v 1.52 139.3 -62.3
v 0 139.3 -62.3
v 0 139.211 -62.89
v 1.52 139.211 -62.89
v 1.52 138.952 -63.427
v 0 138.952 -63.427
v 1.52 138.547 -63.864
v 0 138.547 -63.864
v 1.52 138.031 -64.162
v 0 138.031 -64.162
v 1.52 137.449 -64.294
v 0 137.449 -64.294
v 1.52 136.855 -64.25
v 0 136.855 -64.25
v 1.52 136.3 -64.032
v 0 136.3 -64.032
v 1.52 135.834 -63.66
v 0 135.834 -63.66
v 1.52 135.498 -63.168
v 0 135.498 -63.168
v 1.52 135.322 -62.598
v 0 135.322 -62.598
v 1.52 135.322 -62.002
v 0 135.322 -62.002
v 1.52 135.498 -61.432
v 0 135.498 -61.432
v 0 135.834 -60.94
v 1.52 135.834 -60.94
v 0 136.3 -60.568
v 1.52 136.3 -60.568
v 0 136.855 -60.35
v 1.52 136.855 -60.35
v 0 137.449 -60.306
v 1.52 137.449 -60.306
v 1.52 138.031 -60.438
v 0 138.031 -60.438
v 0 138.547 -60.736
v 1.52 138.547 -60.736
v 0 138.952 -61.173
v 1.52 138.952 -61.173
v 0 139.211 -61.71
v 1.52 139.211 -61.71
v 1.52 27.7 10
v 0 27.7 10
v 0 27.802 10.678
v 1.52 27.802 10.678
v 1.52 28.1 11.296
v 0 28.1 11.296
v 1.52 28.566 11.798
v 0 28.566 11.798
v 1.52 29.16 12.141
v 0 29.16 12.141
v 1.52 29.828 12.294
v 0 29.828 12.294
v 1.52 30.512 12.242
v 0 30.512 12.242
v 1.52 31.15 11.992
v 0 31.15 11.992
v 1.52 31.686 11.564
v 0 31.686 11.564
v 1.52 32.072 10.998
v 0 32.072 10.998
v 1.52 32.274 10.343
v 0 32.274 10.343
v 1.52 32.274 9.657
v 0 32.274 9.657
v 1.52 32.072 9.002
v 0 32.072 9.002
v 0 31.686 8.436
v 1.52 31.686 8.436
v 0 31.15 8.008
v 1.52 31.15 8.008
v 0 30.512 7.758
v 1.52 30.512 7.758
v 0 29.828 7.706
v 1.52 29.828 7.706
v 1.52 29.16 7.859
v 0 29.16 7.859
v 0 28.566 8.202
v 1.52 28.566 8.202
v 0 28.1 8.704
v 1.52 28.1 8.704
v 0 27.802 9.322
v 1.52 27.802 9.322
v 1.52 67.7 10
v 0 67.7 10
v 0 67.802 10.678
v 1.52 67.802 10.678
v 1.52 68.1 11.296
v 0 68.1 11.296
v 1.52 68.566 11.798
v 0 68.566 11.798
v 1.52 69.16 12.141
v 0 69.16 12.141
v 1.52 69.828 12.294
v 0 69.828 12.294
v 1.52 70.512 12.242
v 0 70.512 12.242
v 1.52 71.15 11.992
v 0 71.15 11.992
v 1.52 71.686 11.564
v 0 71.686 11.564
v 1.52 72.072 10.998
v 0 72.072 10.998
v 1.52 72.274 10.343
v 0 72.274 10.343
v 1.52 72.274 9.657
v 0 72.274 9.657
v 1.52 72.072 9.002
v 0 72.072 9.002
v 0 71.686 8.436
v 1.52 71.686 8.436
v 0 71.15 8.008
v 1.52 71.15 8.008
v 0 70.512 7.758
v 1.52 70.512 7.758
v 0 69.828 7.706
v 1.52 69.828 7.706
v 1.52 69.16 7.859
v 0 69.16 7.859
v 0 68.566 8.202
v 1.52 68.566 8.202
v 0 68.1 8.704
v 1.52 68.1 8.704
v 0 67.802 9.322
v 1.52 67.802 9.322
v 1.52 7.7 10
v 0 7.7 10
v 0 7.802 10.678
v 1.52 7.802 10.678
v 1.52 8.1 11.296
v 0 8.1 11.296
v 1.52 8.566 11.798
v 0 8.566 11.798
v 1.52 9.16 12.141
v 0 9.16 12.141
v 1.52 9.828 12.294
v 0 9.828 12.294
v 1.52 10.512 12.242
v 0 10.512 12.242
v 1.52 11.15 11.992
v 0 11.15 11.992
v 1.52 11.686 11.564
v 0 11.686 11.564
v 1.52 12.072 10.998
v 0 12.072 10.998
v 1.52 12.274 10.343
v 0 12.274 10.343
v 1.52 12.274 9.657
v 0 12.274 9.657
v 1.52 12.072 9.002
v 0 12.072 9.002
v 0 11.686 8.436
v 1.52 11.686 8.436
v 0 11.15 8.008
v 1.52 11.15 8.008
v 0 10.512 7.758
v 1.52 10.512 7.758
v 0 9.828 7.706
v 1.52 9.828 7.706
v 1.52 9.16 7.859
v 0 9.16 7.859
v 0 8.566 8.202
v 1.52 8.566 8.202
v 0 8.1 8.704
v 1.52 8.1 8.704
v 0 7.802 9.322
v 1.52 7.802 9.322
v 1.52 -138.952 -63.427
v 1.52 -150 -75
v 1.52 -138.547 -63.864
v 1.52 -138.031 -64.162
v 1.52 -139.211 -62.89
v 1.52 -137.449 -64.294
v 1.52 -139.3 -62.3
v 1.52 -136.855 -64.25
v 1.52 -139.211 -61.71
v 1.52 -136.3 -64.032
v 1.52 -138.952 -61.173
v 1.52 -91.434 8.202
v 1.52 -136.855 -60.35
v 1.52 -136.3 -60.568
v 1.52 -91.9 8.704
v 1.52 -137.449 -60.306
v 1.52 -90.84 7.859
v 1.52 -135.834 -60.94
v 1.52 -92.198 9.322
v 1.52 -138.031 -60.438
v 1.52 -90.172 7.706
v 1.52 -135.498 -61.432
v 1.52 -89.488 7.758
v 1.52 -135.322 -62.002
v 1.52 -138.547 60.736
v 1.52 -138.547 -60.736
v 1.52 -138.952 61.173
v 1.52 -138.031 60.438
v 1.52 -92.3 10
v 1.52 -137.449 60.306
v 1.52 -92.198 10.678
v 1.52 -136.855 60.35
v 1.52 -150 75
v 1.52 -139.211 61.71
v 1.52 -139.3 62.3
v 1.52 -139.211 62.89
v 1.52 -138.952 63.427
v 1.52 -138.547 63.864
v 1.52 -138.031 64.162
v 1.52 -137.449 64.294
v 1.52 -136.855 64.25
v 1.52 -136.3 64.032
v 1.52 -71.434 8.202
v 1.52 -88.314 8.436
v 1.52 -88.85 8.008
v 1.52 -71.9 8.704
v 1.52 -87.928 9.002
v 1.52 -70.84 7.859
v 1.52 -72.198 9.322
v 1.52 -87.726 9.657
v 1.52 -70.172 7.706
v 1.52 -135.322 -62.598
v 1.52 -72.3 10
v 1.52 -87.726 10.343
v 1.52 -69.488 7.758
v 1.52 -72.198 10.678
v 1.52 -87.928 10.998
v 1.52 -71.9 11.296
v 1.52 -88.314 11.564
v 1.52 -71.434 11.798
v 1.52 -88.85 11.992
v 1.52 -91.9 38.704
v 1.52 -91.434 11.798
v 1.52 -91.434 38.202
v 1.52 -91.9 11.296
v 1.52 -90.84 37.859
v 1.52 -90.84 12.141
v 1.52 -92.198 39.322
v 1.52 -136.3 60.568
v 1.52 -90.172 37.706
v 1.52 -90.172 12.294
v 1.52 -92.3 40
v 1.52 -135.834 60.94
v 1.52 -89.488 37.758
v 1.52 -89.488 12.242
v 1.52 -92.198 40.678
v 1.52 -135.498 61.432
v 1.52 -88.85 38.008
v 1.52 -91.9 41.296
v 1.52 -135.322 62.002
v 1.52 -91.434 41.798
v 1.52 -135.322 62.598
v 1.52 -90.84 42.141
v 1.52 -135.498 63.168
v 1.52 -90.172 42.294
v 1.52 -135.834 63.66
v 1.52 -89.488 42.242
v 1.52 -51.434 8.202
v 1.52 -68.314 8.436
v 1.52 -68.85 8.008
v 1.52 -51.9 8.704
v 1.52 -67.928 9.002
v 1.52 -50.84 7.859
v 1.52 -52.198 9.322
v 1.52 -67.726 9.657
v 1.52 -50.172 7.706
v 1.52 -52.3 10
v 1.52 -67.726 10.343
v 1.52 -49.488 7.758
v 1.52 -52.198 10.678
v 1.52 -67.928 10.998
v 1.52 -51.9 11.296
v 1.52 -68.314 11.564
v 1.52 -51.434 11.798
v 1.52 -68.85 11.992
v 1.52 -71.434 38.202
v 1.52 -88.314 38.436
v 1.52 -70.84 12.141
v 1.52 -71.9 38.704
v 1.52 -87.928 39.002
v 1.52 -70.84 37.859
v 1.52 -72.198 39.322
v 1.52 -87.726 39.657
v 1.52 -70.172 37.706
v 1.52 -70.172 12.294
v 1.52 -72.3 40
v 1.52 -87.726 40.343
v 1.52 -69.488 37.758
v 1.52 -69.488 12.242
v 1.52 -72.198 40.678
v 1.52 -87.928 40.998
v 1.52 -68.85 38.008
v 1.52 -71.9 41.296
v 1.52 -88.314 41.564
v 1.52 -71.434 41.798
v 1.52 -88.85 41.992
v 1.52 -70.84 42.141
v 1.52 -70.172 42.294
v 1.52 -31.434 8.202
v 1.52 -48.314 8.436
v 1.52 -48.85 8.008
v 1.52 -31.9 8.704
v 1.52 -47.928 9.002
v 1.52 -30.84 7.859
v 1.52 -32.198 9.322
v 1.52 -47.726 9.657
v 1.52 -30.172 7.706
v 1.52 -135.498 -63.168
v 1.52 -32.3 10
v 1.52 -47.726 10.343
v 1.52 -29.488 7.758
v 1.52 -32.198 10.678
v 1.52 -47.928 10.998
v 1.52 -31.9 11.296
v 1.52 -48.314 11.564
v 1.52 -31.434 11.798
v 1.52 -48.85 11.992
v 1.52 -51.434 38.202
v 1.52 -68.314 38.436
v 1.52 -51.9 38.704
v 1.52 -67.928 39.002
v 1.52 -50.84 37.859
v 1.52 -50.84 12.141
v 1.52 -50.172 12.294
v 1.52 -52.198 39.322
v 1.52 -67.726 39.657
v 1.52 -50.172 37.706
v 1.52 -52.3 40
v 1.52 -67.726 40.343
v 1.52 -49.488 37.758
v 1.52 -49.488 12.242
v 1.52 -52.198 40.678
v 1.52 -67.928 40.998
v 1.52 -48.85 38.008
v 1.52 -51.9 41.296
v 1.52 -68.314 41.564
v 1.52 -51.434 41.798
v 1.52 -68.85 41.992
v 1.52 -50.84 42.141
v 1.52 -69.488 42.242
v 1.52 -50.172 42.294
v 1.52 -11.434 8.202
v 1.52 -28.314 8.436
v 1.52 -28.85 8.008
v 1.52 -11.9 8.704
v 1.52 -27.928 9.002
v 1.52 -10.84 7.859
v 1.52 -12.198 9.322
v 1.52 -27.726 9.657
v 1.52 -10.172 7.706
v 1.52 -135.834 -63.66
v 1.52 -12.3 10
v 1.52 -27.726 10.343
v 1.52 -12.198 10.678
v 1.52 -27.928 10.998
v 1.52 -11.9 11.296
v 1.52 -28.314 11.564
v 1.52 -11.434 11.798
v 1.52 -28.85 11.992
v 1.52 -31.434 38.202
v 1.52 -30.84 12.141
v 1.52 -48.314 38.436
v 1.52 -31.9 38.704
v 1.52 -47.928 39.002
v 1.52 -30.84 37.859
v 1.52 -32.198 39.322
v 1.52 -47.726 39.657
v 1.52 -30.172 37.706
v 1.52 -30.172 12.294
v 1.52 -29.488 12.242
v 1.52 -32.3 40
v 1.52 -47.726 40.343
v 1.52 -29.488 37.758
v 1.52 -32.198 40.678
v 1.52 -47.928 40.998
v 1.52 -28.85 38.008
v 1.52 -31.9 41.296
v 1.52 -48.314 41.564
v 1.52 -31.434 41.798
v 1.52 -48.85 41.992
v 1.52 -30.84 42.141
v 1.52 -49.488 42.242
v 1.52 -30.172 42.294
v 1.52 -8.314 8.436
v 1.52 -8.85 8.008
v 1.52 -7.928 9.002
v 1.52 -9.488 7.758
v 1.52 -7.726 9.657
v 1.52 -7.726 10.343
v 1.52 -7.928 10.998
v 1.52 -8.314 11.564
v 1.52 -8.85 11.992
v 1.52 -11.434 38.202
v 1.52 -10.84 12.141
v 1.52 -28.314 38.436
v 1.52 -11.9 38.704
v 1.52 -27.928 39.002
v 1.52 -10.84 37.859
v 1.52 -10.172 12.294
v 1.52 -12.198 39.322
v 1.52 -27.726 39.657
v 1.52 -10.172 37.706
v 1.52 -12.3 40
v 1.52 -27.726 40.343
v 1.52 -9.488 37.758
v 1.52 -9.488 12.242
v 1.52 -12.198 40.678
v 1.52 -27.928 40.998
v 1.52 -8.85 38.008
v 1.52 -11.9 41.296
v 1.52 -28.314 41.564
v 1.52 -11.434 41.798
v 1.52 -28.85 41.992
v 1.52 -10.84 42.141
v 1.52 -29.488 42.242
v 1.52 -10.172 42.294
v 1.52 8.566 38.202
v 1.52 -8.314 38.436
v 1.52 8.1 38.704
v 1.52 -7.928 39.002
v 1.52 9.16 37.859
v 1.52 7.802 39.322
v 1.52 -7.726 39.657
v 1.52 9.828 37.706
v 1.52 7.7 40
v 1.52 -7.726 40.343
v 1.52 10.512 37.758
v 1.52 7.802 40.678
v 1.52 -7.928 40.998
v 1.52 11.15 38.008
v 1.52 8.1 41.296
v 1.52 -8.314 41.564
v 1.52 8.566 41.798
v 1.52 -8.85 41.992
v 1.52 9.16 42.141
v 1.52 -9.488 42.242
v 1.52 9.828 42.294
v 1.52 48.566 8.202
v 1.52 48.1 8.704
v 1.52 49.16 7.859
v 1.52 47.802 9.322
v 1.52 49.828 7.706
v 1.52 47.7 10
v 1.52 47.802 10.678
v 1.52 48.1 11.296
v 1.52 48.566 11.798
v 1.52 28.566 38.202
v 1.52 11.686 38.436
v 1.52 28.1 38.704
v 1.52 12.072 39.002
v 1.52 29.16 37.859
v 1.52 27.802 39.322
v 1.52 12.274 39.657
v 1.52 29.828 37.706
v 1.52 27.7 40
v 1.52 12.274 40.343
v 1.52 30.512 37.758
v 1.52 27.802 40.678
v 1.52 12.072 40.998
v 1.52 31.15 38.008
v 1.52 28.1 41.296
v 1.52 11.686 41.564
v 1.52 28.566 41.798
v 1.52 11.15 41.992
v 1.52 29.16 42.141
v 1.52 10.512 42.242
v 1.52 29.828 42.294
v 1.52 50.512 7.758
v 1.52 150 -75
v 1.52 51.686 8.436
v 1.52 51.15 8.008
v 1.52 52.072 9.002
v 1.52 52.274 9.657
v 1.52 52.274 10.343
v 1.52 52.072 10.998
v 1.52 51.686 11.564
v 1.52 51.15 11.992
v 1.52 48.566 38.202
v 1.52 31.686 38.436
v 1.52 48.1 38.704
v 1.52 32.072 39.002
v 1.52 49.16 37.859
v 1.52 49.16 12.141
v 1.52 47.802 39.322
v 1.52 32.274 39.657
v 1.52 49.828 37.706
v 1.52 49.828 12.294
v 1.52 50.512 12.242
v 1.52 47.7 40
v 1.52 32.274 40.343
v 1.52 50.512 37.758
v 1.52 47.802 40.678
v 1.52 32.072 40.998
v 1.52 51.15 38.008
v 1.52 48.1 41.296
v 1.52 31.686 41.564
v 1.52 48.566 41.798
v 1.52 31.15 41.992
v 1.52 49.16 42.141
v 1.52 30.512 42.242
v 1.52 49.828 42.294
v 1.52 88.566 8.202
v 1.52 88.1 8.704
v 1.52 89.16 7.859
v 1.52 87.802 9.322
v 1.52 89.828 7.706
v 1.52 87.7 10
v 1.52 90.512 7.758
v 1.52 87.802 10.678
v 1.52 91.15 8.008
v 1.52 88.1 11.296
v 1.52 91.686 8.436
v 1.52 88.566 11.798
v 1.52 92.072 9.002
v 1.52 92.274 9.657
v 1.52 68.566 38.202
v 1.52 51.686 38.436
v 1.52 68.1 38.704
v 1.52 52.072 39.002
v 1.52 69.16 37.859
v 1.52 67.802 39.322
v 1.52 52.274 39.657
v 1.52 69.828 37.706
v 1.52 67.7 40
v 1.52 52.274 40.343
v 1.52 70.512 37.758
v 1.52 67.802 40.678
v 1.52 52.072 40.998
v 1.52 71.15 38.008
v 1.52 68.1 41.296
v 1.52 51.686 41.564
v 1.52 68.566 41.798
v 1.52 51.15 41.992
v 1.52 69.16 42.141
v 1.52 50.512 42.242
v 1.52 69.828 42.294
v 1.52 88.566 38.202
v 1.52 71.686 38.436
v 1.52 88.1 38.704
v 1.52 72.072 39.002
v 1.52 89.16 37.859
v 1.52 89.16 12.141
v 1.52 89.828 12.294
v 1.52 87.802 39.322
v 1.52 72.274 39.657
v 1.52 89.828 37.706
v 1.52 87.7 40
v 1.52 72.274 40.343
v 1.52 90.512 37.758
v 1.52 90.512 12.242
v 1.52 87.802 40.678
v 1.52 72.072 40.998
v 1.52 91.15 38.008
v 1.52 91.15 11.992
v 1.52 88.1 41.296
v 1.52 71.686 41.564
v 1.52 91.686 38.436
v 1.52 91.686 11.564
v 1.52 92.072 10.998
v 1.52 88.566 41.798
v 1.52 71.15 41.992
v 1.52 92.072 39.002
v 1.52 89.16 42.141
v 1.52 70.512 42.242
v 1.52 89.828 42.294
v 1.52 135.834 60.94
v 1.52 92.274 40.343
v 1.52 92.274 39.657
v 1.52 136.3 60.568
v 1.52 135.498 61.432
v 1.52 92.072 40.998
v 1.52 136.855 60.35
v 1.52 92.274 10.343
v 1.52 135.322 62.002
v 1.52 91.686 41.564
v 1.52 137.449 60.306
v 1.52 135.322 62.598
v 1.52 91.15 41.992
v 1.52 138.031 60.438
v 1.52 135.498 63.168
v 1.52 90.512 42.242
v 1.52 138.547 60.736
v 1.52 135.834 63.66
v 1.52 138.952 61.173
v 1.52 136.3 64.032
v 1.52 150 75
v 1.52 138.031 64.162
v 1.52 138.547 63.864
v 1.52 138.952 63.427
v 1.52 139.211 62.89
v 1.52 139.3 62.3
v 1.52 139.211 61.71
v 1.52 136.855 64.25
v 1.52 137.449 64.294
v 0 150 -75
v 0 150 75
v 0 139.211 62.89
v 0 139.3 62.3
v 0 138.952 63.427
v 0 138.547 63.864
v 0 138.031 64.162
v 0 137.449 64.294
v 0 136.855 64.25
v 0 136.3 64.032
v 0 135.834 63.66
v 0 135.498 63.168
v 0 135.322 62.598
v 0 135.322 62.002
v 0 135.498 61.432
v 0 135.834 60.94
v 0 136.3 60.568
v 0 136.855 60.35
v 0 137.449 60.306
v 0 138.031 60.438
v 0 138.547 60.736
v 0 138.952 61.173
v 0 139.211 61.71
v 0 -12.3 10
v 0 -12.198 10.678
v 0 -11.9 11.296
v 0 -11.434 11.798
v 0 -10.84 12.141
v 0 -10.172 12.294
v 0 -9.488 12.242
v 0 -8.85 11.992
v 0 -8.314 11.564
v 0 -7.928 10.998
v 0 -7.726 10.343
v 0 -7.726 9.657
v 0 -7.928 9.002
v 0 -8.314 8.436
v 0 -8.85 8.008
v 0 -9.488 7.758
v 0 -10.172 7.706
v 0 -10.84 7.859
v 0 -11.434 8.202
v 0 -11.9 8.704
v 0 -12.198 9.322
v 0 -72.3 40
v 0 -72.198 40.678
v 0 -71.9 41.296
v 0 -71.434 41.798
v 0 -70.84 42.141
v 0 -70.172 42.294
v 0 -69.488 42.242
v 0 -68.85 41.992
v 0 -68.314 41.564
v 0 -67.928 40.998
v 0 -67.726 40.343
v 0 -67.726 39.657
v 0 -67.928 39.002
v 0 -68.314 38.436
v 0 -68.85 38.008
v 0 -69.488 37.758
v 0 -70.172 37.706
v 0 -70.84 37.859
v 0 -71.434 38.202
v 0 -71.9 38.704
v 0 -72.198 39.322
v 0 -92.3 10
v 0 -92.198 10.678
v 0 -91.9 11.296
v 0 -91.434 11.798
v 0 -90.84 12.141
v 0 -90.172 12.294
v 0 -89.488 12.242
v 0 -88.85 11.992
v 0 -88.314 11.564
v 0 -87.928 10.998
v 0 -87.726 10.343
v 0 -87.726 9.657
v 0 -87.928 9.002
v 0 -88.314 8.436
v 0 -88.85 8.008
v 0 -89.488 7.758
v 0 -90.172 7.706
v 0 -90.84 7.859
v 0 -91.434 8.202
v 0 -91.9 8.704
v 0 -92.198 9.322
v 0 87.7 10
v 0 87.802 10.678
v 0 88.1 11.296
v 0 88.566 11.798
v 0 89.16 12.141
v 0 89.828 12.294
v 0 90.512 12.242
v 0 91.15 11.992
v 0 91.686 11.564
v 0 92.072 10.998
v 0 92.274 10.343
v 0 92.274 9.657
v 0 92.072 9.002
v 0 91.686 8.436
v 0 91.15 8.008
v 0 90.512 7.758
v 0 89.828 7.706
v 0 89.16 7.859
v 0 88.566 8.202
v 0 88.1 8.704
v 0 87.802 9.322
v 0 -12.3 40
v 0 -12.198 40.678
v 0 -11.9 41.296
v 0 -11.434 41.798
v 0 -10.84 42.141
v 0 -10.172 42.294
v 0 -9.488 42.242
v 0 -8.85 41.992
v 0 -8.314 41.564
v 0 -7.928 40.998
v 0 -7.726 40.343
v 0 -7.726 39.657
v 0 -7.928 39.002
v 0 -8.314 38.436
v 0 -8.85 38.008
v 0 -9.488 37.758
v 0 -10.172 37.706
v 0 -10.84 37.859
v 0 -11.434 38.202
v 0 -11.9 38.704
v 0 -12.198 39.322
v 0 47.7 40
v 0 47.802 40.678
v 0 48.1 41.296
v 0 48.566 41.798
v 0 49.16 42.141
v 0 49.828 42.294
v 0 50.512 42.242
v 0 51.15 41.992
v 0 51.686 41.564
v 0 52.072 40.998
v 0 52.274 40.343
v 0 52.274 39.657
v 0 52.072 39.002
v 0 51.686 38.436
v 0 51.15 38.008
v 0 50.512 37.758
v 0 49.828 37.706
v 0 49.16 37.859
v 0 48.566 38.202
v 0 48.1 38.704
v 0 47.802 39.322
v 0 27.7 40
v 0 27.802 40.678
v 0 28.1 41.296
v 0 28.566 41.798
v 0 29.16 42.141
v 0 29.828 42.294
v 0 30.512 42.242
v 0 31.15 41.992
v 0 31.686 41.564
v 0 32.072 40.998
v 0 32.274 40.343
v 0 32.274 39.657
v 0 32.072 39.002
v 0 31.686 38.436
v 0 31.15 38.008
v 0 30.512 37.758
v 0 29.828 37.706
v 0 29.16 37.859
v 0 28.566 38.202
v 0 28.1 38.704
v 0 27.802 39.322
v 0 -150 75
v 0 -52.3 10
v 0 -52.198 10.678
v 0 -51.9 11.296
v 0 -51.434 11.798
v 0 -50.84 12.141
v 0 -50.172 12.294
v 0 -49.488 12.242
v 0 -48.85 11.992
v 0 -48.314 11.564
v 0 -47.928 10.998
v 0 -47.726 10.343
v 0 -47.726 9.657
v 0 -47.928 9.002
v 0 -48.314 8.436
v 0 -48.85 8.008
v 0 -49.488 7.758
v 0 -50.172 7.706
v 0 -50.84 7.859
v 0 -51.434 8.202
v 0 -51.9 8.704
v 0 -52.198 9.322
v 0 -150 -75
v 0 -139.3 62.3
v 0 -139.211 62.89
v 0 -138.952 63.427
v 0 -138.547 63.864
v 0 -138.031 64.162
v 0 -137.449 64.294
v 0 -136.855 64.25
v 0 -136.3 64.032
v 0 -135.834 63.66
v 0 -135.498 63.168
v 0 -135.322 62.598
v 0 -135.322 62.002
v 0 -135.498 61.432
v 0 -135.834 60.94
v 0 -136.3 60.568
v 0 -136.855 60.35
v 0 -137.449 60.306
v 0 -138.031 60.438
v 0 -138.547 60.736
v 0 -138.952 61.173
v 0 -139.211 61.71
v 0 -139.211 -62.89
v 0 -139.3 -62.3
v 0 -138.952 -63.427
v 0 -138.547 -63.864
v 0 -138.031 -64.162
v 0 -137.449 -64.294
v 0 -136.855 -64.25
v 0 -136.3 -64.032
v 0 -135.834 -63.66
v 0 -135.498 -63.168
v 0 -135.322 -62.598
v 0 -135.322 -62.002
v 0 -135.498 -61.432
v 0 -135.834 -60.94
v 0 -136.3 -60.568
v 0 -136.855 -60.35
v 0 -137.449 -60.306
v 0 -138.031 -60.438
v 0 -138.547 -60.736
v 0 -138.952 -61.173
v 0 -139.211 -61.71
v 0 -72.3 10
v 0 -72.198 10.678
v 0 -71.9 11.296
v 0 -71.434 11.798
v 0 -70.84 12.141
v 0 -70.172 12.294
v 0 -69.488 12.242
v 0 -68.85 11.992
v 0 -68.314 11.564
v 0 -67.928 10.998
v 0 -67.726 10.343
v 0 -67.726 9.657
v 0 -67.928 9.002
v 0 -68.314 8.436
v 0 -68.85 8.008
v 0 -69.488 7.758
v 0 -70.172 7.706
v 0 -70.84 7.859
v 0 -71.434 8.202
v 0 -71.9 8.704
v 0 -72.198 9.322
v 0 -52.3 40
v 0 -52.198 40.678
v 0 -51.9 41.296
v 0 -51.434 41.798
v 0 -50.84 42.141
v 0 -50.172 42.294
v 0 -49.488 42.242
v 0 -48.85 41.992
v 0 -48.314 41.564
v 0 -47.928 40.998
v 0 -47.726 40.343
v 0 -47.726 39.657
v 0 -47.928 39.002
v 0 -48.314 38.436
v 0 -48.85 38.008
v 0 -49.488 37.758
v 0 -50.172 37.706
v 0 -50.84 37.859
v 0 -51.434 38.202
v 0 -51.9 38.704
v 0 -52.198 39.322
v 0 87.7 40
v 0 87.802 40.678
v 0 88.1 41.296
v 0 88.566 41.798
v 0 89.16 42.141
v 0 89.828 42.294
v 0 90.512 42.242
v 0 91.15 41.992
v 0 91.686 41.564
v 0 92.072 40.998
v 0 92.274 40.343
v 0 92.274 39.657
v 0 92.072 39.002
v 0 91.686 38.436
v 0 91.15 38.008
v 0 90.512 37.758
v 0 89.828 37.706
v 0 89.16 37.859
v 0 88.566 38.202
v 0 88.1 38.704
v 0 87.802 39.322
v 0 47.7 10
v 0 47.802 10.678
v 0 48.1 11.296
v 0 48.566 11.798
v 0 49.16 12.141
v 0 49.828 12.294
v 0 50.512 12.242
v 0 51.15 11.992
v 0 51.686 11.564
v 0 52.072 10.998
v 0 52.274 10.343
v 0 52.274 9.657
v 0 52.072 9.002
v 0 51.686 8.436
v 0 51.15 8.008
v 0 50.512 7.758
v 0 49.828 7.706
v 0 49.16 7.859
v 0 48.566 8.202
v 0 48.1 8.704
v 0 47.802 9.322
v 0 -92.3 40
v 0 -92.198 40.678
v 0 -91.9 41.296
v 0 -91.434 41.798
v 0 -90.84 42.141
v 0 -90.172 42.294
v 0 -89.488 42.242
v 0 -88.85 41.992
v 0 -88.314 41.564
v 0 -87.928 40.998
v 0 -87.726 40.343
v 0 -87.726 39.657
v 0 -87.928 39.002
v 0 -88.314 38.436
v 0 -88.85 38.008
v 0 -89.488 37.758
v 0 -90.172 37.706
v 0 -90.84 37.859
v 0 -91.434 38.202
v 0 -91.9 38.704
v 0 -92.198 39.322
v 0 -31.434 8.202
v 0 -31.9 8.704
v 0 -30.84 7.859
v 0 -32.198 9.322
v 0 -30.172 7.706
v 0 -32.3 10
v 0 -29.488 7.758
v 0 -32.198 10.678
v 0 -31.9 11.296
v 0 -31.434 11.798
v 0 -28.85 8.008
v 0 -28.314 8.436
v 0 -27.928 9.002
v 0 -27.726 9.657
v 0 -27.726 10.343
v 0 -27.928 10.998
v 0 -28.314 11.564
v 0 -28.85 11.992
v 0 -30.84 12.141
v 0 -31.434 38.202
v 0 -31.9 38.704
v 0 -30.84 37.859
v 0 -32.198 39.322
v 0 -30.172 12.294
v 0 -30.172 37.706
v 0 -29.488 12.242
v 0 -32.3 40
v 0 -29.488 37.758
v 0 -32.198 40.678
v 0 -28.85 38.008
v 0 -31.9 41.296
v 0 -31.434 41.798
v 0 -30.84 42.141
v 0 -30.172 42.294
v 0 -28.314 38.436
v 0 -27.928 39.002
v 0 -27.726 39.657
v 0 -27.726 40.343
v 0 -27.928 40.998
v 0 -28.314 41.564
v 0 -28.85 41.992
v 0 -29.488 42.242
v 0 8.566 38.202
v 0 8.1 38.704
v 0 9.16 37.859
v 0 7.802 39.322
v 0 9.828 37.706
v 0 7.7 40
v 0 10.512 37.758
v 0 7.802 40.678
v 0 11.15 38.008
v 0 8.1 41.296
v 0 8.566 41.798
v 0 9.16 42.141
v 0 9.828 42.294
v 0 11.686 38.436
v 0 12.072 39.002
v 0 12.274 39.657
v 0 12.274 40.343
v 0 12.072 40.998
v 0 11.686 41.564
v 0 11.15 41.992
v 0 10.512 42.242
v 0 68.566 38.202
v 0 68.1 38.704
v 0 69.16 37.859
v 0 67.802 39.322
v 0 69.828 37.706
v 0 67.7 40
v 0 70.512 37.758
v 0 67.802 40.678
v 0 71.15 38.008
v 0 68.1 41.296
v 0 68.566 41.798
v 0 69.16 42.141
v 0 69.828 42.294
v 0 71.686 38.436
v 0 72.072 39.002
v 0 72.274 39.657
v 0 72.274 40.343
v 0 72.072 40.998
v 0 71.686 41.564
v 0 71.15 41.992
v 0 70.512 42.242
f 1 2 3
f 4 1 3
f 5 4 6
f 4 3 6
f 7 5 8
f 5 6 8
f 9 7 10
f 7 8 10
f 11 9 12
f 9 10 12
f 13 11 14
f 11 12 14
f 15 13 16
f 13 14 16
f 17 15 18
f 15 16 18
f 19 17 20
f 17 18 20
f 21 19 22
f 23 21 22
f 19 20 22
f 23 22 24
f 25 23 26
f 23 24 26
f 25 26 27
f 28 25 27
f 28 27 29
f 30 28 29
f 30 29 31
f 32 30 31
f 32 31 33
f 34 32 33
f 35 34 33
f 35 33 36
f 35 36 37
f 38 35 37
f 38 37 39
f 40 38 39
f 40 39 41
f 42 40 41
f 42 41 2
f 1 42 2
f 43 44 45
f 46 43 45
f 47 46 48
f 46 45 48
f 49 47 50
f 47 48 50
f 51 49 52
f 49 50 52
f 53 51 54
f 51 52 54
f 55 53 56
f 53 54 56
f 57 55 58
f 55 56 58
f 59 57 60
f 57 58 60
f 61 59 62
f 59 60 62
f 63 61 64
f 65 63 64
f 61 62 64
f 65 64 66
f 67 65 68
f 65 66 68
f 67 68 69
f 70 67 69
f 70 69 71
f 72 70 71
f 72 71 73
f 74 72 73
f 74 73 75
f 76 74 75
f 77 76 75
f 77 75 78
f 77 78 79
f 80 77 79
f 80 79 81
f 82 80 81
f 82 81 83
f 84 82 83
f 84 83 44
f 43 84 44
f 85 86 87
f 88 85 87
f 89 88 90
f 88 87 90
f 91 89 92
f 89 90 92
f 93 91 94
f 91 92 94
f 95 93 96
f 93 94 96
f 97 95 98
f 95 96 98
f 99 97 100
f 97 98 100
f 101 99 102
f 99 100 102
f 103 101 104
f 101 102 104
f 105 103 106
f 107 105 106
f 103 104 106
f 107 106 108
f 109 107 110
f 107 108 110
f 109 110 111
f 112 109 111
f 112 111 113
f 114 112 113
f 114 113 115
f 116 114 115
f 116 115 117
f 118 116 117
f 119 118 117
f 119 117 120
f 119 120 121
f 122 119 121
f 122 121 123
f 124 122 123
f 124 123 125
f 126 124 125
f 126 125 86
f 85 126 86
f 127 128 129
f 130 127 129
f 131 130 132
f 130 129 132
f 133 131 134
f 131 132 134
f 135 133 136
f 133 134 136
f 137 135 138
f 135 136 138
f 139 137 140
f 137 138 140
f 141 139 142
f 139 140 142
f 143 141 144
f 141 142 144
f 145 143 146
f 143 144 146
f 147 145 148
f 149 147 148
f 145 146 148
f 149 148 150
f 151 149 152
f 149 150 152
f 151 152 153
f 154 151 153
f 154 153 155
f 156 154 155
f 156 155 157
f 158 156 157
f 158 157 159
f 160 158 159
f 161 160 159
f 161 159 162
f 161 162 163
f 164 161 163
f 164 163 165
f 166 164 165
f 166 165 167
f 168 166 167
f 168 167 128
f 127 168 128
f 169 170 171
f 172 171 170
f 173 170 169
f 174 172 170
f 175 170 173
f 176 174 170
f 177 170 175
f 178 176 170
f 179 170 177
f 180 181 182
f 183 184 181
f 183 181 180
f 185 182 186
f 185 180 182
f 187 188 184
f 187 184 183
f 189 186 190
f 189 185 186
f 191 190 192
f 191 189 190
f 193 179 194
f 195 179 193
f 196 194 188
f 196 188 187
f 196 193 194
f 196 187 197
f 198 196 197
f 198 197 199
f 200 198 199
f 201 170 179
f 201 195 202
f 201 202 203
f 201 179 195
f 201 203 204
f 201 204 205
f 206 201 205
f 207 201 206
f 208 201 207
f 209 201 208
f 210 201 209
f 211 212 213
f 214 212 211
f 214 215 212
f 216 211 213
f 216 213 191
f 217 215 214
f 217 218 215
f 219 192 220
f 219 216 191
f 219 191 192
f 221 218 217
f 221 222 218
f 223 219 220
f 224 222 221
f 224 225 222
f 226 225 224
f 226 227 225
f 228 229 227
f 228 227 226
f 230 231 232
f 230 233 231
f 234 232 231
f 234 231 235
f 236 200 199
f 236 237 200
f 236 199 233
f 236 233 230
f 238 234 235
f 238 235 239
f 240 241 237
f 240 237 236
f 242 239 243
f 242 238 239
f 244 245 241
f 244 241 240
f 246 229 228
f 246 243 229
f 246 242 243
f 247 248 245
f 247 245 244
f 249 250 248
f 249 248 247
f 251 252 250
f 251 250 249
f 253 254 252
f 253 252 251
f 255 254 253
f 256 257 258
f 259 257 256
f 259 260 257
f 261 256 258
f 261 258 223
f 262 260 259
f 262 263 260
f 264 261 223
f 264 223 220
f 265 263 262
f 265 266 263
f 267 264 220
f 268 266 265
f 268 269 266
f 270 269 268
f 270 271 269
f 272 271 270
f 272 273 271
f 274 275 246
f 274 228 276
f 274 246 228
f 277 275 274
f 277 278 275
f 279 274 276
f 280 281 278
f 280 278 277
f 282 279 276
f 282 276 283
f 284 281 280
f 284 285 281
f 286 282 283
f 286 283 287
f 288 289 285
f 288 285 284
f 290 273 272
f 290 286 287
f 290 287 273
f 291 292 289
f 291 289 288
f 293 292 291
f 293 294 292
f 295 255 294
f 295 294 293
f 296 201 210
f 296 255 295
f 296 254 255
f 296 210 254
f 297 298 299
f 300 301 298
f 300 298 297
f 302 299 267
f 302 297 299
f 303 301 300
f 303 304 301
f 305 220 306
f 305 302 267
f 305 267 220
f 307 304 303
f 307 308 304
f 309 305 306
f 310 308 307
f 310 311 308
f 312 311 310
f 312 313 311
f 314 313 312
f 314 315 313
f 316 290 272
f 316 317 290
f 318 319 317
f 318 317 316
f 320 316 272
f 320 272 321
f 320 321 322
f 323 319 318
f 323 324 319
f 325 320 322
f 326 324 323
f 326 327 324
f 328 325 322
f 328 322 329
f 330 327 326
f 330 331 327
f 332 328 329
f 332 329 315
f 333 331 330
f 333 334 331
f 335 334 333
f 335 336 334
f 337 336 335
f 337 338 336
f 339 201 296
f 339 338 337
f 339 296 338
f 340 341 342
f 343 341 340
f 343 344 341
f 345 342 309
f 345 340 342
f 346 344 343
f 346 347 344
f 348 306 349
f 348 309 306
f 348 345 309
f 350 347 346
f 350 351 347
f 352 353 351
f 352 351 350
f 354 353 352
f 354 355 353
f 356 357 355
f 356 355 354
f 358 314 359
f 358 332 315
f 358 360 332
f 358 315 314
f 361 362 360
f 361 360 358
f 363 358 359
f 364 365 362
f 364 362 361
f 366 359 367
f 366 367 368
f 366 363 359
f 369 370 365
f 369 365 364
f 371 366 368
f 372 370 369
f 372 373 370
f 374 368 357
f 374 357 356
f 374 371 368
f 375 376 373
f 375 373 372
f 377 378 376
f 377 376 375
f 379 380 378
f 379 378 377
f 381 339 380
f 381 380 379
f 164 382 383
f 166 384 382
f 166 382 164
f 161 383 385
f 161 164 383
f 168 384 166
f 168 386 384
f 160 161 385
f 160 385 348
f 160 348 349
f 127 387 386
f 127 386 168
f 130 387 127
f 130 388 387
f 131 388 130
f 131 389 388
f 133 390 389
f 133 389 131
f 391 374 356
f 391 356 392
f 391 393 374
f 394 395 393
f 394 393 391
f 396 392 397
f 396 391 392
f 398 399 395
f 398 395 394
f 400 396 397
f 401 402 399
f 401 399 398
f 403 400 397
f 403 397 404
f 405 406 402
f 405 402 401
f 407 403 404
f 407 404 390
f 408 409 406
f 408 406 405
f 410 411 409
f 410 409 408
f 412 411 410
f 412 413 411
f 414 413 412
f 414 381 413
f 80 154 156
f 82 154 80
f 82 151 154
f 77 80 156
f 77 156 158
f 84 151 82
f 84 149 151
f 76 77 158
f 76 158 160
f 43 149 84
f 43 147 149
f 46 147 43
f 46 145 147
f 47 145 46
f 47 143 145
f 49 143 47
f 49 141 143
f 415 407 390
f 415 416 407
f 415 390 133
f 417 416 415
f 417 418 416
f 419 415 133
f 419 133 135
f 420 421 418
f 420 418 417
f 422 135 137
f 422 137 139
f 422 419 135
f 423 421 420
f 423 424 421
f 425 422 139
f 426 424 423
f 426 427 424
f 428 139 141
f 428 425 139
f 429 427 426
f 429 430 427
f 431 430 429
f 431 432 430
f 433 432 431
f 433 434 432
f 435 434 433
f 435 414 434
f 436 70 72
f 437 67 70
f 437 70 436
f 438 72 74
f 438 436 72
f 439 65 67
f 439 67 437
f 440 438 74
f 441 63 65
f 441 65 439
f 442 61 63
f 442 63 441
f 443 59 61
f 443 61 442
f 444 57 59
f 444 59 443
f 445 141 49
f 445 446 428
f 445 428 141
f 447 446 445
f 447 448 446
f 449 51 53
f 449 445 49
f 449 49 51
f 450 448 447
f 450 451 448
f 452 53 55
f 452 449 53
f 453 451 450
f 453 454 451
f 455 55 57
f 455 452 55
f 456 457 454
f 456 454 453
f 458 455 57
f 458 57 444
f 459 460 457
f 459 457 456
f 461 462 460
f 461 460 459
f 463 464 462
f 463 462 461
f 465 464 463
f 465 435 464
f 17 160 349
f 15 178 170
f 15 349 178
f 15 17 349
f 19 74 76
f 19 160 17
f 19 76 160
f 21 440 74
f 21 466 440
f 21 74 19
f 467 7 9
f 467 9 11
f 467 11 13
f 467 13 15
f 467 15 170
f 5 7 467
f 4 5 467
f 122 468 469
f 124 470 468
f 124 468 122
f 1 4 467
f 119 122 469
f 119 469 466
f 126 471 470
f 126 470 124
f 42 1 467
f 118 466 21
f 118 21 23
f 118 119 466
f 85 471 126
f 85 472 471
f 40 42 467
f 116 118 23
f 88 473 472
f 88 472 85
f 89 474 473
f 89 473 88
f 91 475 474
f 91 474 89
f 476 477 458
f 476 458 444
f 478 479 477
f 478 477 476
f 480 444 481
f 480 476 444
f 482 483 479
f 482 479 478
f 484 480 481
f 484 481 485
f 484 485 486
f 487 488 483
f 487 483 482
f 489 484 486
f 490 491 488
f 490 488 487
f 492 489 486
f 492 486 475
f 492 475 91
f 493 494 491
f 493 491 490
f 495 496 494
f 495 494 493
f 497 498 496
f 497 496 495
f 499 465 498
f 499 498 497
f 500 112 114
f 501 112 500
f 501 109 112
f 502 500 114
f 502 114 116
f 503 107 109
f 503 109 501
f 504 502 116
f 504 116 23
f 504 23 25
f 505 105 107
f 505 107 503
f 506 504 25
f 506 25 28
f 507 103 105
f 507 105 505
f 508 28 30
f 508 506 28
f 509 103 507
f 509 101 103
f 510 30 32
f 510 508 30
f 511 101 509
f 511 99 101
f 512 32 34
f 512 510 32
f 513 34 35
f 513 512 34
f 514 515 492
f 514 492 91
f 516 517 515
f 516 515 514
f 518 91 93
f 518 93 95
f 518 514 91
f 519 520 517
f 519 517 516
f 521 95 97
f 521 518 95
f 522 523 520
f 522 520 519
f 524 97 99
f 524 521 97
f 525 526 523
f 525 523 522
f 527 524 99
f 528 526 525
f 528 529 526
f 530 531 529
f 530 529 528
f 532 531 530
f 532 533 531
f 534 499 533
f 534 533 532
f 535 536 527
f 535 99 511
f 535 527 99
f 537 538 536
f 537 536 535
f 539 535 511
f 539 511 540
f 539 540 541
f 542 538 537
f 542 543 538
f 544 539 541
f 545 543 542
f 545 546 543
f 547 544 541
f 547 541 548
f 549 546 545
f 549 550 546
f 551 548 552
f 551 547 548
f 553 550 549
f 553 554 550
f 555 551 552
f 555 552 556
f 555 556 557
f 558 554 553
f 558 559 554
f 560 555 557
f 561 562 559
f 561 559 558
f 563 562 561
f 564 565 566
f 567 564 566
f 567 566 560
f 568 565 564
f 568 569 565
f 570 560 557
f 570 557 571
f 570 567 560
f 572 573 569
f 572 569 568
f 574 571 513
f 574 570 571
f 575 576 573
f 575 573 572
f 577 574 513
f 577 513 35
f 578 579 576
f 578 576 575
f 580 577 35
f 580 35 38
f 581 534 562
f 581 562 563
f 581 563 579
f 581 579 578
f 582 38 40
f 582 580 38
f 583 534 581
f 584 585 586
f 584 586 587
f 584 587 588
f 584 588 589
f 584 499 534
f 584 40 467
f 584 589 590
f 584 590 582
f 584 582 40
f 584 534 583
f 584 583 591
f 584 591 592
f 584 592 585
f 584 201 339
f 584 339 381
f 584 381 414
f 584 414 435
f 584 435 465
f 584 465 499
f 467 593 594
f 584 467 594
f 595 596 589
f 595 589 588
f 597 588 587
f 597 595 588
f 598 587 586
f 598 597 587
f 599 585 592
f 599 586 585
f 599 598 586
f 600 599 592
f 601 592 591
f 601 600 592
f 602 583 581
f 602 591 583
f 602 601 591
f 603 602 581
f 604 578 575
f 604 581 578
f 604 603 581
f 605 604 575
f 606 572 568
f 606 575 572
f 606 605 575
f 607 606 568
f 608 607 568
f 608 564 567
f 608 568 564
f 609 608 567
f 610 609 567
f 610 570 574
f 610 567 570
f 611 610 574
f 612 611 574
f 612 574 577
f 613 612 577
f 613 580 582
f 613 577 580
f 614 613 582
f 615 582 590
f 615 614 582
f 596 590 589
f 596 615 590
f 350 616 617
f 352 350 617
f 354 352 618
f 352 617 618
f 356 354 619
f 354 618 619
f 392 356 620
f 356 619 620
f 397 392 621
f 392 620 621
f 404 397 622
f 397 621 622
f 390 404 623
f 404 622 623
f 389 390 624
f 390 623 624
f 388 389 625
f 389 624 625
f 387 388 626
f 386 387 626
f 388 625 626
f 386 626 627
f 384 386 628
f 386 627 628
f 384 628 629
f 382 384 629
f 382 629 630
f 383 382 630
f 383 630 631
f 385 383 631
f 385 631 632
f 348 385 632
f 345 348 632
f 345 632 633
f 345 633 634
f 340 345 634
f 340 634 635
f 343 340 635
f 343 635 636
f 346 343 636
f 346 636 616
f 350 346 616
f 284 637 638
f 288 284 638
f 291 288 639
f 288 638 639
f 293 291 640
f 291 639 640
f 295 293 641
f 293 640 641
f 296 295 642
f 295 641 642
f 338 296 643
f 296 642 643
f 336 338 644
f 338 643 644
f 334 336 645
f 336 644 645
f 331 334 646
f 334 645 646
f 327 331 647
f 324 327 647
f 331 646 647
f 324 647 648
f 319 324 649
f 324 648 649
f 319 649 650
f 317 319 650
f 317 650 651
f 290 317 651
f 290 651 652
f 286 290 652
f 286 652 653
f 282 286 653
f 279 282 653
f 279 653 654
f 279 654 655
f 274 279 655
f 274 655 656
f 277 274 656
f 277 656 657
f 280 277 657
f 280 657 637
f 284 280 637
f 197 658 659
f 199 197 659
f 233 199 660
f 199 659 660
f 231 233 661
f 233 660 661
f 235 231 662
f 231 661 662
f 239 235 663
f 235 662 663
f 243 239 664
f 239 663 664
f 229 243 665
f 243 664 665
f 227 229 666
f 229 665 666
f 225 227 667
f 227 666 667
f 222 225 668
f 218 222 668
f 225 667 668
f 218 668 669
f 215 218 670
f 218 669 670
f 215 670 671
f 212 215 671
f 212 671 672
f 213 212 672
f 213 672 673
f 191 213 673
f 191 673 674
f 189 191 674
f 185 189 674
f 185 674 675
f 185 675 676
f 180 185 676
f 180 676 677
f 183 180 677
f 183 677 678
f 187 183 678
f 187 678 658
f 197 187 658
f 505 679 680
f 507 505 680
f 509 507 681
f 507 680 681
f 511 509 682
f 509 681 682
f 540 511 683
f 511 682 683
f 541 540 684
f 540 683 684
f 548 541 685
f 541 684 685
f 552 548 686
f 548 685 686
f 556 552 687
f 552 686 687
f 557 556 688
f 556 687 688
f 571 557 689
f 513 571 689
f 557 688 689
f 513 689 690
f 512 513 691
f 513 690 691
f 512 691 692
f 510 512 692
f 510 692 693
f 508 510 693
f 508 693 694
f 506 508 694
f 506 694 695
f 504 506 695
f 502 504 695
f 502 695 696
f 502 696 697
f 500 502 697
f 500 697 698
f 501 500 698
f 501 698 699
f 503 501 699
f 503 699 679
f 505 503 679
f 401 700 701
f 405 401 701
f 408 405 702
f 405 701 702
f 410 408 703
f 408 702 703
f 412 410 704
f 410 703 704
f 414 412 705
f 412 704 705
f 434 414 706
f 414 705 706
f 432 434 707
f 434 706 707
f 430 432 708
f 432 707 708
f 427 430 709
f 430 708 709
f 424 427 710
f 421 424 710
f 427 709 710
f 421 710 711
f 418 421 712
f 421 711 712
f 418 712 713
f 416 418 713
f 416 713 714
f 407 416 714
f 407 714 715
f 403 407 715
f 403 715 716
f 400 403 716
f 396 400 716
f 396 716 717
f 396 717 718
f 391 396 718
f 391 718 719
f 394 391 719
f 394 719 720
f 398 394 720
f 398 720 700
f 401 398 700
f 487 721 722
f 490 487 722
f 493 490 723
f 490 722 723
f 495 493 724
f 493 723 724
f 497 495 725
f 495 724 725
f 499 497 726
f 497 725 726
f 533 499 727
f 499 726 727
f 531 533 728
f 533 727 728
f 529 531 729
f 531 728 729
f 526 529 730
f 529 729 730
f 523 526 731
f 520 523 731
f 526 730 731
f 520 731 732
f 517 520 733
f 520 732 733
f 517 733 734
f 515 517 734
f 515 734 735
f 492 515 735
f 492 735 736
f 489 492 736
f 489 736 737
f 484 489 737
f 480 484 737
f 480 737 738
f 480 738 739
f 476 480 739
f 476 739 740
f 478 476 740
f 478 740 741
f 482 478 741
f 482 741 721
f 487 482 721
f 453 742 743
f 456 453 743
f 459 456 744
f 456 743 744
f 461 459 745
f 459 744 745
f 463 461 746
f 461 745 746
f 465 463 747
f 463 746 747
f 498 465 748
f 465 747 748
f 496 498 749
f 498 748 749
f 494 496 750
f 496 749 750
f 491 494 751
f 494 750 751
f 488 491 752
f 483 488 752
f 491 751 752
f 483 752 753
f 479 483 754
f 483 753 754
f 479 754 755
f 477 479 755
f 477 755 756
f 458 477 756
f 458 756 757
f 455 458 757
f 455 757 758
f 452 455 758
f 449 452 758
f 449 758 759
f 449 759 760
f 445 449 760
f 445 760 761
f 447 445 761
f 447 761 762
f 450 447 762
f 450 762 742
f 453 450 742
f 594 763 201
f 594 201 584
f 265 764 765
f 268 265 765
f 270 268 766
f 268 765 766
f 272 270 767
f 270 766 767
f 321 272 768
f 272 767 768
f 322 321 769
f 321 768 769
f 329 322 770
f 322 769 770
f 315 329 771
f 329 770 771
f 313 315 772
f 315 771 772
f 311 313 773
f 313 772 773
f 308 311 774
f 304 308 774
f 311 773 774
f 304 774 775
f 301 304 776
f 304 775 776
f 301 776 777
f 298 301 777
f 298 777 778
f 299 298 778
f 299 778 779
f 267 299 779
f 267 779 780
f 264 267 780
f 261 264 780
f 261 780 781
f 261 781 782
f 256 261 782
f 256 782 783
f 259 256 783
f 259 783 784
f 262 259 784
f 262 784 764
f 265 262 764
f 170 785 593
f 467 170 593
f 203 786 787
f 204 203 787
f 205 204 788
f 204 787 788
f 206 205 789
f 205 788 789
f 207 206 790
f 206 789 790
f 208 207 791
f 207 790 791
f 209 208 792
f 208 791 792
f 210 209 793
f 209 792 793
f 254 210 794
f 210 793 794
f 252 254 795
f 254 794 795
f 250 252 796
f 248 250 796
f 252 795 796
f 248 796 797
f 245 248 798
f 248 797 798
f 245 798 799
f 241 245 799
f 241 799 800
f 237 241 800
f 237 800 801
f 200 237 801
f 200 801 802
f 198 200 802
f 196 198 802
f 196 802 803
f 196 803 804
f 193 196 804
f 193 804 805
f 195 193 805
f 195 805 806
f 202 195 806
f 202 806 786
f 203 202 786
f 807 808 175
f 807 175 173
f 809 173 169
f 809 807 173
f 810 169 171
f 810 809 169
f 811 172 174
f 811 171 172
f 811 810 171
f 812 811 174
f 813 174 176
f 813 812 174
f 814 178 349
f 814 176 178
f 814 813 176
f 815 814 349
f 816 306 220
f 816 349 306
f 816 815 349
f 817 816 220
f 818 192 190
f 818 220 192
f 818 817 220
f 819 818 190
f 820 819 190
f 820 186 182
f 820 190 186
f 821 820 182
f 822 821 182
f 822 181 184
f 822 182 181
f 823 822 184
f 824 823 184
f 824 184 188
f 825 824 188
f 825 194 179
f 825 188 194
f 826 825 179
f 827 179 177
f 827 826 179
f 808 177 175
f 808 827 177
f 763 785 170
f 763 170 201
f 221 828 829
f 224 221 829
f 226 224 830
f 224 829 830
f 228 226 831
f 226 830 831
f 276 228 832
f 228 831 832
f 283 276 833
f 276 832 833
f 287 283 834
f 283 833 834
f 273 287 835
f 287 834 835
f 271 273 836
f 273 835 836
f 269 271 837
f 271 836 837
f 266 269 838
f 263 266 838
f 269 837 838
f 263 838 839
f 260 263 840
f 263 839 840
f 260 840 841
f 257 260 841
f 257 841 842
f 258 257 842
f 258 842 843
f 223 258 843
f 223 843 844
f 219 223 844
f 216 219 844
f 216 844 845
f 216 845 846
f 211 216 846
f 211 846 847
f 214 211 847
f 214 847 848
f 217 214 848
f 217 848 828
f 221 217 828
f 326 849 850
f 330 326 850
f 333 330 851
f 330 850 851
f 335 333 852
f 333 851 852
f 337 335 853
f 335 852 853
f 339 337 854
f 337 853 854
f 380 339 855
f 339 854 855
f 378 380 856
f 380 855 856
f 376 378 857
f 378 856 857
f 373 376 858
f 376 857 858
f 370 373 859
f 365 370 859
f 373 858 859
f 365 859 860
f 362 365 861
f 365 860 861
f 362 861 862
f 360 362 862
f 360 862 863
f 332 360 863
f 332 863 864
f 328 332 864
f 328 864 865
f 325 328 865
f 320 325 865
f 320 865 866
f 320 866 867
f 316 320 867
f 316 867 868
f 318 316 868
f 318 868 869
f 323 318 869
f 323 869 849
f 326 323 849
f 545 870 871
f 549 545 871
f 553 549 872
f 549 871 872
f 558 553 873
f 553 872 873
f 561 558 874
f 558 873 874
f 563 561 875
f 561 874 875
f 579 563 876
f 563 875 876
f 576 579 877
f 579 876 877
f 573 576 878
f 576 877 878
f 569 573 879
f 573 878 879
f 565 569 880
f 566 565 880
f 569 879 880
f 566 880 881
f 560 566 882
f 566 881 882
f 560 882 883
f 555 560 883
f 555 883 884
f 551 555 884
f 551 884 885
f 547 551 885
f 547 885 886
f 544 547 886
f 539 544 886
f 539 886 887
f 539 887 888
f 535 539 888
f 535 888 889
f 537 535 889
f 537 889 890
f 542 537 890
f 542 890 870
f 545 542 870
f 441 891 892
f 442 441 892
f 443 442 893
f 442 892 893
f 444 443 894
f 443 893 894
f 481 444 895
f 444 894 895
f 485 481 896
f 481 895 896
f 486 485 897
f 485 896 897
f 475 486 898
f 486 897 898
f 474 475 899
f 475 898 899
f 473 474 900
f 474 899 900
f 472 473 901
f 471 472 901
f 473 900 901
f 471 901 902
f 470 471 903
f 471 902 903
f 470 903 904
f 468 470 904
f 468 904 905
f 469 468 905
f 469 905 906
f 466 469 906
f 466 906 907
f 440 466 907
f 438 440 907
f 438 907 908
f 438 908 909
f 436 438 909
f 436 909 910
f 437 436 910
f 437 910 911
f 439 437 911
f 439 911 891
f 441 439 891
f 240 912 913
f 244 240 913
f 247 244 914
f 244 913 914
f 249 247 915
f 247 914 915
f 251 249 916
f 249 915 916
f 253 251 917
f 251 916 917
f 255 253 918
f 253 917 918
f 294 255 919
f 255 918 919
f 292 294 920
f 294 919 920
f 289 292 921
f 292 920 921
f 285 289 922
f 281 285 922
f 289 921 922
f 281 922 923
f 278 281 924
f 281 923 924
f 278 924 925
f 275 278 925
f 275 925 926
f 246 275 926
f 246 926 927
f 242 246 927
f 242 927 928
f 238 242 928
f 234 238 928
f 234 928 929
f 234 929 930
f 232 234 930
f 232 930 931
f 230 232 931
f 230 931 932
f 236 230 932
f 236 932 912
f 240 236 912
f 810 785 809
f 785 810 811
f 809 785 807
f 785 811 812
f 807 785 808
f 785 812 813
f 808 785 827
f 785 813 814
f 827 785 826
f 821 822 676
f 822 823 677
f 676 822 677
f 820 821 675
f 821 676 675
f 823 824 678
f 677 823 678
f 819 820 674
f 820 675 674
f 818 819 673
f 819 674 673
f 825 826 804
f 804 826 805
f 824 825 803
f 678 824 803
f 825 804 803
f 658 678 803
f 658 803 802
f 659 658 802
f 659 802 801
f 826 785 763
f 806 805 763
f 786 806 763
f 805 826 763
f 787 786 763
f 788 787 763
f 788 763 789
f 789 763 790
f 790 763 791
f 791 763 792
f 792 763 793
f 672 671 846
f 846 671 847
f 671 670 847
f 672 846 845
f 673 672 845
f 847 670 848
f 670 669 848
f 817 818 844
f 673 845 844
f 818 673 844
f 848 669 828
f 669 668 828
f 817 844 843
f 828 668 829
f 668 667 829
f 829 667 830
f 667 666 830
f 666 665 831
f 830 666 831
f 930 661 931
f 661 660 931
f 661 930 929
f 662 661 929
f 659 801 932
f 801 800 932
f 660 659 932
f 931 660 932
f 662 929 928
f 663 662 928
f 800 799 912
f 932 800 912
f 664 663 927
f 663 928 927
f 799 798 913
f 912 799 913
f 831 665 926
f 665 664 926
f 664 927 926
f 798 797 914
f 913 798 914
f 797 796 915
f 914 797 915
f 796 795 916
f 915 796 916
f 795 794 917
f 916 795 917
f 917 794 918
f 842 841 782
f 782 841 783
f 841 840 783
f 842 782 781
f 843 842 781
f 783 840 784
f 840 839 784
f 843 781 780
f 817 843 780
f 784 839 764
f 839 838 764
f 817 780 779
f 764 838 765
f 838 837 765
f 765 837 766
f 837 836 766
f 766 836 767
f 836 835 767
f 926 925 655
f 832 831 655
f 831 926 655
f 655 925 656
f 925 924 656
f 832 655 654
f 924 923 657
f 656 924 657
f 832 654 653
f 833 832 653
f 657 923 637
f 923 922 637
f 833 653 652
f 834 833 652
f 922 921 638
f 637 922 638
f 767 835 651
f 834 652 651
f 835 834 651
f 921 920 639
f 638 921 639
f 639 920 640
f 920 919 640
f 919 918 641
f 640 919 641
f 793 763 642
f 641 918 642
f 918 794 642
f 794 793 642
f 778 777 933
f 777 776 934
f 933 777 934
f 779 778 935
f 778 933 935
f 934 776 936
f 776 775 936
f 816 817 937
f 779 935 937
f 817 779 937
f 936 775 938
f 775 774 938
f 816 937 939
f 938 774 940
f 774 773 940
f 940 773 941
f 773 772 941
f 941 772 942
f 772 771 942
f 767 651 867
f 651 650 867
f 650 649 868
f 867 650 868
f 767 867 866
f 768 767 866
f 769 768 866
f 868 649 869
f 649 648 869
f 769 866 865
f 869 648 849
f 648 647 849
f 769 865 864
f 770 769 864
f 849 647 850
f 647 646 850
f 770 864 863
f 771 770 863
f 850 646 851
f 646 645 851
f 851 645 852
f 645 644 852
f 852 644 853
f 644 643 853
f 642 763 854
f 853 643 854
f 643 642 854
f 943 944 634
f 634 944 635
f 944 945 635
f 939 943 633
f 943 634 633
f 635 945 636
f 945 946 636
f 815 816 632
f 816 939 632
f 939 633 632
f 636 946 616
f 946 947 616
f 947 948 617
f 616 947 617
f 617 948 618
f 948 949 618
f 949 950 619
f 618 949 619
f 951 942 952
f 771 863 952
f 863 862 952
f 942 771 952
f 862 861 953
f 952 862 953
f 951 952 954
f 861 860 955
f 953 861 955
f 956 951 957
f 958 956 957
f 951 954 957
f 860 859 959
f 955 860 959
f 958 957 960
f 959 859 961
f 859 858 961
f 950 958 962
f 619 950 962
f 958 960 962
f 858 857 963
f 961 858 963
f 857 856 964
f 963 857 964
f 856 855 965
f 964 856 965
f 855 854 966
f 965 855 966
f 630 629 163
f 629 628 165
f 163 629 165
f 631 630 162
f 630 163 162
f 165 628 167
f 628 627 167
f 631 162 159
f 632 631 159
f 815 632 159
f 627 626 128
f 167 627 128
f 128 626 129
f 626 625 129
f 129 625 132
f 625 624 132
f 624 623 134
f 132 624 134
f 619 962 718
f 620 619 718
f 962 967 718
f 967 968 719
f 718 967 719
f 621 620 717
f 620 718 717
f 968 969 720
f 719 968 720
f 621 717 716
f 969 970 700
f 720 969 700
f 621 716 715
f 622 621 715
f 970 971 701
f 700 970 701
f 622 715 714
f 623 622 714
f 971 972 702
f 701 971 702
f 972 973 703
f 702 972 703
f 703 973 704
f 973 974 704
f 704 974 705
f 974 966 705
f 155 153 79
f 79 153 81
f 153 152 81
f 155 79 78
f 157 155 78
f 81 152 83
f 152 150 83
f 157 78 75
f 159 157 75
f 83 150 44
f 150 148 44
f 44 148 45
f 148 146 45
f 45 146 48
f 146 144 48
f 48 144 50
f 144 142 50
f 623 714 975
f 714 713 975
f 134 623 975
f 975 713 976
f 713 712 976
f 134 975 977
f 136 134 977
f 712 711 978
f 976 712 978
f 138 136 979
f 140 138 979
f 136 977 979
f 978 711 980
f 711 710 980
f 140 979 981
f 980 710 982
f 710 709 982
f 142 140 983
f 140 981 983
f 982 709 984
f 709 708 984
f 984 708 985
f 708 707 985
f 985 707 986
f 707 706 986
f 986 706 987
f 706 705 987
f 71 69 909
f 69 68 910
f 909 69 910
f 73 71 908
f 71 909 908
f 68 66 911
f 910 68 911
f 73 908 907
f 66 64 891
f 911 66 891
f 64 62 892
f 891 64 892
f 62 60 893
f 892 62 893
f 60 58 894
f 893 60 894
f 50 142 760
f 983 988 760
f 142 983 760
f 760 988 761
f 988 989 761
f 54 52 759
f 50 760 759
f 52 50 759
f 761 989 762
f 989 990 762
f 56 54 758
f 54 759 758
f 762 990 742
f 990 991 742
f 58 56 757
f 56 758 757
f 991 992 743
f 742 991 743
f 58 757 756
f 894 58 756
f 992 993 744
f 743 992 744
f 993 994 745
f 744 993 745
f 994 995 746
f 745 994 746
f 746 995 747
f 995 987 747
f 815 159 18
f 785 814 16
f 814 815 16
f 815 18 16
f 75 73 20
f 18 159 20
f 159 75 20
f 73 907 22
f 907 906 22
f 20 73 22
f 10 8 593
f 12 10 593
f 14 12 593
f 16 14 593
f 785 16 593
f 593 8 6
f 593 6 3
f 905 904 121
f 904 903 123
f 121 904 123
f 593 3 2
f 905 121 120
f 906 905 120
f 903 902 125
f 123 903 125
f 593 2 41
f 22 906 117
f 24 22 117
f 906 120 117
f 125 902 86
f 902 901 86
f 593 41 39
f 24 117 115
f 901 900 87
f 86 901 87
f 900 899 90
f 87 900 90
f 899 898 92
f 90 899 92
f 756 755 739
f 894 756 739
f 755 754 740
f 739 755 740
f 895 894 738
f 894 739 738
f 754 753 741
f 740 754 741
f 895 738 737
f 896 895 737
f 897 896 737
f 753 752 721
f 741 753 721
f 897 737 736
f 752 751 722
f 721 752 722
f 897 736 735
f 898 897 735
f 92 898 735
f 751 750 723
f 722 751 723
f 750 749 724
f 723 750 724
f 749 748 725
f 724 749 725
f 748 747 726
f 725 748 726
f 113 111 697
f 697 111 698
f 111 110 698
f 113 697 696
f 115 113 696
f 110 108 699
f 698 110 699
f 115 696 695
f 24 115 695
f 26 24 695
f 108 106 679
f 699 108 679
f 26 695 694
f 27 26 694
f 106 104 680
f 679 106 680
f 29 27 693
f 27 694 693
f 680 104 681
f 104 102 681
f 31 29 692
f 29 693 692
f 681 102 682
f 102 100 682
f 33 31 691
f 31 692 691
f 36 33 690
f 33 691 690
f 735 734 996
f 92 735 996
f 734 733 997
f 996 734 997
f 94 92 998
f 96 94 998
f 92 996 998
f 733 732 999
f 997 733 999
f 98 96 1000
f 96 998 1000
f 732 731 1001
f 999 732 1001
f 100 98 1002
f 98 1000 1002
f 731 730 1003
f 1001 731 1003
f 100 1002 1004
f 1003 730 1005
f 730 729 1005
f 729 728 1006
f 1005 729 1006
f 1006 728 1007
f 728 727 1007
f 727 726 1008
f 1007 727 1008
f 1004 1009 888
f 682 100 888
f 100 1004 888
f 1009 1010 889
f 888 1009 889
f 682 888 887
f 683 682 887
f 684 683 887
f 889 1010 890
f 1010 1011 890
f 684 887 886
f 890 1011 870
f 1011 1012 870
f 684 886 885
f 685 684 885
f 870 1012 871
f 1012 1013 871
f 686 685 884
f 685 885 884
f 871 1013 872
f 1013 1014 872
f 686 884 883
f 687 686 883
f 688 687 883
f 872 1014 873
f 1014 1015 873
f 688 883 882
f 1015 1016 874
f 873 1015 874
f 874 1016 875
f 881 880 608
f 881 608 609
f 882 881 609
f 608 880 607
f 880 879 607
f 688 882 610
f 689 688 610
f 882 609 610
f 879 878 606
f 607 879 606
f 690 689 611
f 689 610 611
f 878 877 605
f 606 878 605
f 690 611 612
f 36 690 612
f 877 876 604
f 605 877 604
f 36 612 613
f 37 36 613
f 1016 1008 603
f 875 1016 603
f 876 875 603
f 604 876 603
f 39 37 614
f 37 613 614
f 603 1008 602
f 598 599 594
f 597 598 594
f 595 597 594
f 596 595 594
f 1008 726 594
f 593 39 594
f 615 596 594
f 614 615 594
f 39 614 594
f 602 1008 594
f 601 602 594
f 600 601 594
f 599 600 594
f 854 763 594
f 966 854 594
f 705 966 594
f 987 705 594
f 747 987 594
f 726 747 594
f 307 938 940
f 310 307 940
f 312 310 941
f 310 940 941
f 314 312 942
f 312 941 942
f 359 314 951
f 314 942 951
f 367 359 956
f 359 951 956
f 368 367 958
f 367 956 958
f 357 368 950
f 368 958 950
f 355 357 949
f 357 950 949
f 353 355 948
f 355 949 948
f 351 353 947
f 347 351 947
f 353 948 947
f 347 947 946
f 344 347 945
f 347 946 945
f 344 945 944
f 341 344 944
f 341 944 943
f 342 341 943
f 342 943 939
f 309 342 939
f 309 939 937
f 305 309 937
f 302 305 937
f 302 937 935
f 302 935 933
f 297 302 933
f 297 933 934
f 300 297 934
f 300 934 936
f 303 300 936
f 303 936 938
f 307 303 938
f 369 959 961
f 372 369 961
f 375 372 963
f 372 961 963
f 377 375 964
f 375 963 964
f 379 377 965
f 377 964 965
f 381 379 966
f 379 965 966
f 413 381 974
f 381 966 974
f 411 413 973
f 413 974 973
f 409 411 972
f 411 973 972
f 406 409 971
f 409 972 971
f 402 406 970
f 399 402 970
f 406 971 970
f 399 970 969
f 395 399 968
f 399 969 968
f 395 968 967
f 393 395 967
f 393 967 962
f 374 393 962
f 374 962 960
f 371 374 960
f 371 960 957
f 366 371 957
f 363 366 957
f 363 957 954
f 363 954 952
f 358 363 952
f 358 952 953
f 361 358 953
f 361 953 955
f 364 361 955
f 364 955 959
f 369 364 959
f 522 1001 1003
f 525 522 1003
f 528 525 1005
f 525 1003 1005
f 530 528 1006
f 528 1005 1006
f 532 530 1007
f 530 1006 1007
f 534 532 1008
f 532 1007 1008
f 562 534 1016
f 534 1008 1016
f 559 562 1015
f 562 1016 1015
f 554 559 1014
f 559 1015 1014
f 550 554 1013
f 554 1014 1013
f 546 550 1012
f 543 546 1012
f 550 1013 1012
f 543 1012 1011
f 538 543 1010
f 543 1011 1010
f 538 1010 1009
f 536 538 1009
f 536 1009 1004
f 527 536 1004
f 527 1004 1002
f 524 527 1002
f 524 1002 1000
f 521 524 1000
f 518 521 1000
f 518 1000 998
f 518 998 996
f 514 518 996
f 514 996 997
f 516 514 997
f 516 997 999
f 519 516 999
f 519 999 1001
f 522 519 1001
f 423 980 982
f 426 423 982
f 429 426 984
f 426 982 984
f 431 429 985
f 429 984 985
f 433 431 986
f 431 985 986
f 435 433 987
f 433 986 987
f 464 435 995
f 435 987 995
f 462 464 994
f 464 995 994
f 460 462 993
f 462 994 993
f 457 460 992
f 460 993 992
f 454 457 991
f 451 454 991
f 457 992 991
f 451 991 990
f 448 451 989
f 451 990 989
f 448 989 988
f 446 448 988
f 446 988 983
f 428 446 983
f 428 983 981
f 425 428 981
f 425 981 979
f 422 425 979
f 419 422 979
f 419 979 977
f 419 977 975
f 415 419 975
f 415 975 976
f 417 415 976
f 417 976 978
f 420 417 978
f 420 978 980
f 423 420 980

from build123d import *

# Parameters (mm, degrees)
SKETCH1_W                            = 300
SKETCH1_H                            = 150
BOSS_EXTRUDE1_DEPTH                  = 1.52
F_4_0_4_DIAMETER_HOLE1_D             = 4
MIRROR1_AT_THE_SECOND_PLANE_COPY_1_D = 4
F_4_6_4_6_DIAMETER_HOLE1_D           = 4.6
F_4_6_4_6_DIAMETER_HOLE2_D           = 4.6


with BuildPart() as part:
    # Sketch1 → Boss-Extrude1 (new body)
    with BuildSketch(Plane.YZ):
        Rectangle(SKETCH1_W, SKETCH1_H)
    extrude(amount=BOSS_EXTRUDE1_DEPTH)

    # Ø4.0 (4) Diameter Hole1 (through all)
    with Locations(Plane.YZ.offset(1.52)):
        with Locations((-137.3, 62.3)):
            f_4_0_4_diameter_hole1 = Hole(F_4_0_4_DIAMETER_HOLE1_D / 2)

    # Mirror1: Ø4.0 (4) Diameter Hole1 across plane
    add(f_4_0_4_diameter_hole1.mirror(Plane.ZX), mode=Mode.SUBTRACT)

    # Mirror1 at the second plane: Ø4.0 (4) Diameter Hole1 across plane
    add(f_4_0_4_diameter_hole1.mirror(Plane.XY), mode=Mode.SUBTRACT)

    # Mirror1 at the second plane copy 1 (through all)
    with Locations(Plane(origin=(1.52, 0, 0), x_dir=(0, -1, 0), z_dir=(1, 0, 0))):
        with Locations((-137.3, 62.3)):
            Hole(MIRROR1_AT_THE_SECOND_PLANE_COPY_1_D / 2)

    # Ø4.6 (4.6) Diameter Hole1 (through all)
    with Locations(Plane.YZ.offset(1.52)):
        with Locations((-90, 40), (-70, 40), (-50, 40), (-30, 40), (-10, 40), (10, 40), (30, 40), (50, 40), (70, 40), (90, 40)):
            Hole(F_4_6_4_6_DIAMETER_HOLE1_D / 2)

    # Ø4.6 (4.6) Diameter Hole2 (through all)
    with Locations(Plane.YZ.offset(1.52)):
        with Locations((-90, 10), (-70, 10), (-50, 10), (-30, 10), (-10, 10), (10, 10), (30, 10), (50, 10), (70, 10), (90, 10)):
            Hole(F_4_6_4_6_DIAMETER_HOLE2_D / 2)


solid = part.part
